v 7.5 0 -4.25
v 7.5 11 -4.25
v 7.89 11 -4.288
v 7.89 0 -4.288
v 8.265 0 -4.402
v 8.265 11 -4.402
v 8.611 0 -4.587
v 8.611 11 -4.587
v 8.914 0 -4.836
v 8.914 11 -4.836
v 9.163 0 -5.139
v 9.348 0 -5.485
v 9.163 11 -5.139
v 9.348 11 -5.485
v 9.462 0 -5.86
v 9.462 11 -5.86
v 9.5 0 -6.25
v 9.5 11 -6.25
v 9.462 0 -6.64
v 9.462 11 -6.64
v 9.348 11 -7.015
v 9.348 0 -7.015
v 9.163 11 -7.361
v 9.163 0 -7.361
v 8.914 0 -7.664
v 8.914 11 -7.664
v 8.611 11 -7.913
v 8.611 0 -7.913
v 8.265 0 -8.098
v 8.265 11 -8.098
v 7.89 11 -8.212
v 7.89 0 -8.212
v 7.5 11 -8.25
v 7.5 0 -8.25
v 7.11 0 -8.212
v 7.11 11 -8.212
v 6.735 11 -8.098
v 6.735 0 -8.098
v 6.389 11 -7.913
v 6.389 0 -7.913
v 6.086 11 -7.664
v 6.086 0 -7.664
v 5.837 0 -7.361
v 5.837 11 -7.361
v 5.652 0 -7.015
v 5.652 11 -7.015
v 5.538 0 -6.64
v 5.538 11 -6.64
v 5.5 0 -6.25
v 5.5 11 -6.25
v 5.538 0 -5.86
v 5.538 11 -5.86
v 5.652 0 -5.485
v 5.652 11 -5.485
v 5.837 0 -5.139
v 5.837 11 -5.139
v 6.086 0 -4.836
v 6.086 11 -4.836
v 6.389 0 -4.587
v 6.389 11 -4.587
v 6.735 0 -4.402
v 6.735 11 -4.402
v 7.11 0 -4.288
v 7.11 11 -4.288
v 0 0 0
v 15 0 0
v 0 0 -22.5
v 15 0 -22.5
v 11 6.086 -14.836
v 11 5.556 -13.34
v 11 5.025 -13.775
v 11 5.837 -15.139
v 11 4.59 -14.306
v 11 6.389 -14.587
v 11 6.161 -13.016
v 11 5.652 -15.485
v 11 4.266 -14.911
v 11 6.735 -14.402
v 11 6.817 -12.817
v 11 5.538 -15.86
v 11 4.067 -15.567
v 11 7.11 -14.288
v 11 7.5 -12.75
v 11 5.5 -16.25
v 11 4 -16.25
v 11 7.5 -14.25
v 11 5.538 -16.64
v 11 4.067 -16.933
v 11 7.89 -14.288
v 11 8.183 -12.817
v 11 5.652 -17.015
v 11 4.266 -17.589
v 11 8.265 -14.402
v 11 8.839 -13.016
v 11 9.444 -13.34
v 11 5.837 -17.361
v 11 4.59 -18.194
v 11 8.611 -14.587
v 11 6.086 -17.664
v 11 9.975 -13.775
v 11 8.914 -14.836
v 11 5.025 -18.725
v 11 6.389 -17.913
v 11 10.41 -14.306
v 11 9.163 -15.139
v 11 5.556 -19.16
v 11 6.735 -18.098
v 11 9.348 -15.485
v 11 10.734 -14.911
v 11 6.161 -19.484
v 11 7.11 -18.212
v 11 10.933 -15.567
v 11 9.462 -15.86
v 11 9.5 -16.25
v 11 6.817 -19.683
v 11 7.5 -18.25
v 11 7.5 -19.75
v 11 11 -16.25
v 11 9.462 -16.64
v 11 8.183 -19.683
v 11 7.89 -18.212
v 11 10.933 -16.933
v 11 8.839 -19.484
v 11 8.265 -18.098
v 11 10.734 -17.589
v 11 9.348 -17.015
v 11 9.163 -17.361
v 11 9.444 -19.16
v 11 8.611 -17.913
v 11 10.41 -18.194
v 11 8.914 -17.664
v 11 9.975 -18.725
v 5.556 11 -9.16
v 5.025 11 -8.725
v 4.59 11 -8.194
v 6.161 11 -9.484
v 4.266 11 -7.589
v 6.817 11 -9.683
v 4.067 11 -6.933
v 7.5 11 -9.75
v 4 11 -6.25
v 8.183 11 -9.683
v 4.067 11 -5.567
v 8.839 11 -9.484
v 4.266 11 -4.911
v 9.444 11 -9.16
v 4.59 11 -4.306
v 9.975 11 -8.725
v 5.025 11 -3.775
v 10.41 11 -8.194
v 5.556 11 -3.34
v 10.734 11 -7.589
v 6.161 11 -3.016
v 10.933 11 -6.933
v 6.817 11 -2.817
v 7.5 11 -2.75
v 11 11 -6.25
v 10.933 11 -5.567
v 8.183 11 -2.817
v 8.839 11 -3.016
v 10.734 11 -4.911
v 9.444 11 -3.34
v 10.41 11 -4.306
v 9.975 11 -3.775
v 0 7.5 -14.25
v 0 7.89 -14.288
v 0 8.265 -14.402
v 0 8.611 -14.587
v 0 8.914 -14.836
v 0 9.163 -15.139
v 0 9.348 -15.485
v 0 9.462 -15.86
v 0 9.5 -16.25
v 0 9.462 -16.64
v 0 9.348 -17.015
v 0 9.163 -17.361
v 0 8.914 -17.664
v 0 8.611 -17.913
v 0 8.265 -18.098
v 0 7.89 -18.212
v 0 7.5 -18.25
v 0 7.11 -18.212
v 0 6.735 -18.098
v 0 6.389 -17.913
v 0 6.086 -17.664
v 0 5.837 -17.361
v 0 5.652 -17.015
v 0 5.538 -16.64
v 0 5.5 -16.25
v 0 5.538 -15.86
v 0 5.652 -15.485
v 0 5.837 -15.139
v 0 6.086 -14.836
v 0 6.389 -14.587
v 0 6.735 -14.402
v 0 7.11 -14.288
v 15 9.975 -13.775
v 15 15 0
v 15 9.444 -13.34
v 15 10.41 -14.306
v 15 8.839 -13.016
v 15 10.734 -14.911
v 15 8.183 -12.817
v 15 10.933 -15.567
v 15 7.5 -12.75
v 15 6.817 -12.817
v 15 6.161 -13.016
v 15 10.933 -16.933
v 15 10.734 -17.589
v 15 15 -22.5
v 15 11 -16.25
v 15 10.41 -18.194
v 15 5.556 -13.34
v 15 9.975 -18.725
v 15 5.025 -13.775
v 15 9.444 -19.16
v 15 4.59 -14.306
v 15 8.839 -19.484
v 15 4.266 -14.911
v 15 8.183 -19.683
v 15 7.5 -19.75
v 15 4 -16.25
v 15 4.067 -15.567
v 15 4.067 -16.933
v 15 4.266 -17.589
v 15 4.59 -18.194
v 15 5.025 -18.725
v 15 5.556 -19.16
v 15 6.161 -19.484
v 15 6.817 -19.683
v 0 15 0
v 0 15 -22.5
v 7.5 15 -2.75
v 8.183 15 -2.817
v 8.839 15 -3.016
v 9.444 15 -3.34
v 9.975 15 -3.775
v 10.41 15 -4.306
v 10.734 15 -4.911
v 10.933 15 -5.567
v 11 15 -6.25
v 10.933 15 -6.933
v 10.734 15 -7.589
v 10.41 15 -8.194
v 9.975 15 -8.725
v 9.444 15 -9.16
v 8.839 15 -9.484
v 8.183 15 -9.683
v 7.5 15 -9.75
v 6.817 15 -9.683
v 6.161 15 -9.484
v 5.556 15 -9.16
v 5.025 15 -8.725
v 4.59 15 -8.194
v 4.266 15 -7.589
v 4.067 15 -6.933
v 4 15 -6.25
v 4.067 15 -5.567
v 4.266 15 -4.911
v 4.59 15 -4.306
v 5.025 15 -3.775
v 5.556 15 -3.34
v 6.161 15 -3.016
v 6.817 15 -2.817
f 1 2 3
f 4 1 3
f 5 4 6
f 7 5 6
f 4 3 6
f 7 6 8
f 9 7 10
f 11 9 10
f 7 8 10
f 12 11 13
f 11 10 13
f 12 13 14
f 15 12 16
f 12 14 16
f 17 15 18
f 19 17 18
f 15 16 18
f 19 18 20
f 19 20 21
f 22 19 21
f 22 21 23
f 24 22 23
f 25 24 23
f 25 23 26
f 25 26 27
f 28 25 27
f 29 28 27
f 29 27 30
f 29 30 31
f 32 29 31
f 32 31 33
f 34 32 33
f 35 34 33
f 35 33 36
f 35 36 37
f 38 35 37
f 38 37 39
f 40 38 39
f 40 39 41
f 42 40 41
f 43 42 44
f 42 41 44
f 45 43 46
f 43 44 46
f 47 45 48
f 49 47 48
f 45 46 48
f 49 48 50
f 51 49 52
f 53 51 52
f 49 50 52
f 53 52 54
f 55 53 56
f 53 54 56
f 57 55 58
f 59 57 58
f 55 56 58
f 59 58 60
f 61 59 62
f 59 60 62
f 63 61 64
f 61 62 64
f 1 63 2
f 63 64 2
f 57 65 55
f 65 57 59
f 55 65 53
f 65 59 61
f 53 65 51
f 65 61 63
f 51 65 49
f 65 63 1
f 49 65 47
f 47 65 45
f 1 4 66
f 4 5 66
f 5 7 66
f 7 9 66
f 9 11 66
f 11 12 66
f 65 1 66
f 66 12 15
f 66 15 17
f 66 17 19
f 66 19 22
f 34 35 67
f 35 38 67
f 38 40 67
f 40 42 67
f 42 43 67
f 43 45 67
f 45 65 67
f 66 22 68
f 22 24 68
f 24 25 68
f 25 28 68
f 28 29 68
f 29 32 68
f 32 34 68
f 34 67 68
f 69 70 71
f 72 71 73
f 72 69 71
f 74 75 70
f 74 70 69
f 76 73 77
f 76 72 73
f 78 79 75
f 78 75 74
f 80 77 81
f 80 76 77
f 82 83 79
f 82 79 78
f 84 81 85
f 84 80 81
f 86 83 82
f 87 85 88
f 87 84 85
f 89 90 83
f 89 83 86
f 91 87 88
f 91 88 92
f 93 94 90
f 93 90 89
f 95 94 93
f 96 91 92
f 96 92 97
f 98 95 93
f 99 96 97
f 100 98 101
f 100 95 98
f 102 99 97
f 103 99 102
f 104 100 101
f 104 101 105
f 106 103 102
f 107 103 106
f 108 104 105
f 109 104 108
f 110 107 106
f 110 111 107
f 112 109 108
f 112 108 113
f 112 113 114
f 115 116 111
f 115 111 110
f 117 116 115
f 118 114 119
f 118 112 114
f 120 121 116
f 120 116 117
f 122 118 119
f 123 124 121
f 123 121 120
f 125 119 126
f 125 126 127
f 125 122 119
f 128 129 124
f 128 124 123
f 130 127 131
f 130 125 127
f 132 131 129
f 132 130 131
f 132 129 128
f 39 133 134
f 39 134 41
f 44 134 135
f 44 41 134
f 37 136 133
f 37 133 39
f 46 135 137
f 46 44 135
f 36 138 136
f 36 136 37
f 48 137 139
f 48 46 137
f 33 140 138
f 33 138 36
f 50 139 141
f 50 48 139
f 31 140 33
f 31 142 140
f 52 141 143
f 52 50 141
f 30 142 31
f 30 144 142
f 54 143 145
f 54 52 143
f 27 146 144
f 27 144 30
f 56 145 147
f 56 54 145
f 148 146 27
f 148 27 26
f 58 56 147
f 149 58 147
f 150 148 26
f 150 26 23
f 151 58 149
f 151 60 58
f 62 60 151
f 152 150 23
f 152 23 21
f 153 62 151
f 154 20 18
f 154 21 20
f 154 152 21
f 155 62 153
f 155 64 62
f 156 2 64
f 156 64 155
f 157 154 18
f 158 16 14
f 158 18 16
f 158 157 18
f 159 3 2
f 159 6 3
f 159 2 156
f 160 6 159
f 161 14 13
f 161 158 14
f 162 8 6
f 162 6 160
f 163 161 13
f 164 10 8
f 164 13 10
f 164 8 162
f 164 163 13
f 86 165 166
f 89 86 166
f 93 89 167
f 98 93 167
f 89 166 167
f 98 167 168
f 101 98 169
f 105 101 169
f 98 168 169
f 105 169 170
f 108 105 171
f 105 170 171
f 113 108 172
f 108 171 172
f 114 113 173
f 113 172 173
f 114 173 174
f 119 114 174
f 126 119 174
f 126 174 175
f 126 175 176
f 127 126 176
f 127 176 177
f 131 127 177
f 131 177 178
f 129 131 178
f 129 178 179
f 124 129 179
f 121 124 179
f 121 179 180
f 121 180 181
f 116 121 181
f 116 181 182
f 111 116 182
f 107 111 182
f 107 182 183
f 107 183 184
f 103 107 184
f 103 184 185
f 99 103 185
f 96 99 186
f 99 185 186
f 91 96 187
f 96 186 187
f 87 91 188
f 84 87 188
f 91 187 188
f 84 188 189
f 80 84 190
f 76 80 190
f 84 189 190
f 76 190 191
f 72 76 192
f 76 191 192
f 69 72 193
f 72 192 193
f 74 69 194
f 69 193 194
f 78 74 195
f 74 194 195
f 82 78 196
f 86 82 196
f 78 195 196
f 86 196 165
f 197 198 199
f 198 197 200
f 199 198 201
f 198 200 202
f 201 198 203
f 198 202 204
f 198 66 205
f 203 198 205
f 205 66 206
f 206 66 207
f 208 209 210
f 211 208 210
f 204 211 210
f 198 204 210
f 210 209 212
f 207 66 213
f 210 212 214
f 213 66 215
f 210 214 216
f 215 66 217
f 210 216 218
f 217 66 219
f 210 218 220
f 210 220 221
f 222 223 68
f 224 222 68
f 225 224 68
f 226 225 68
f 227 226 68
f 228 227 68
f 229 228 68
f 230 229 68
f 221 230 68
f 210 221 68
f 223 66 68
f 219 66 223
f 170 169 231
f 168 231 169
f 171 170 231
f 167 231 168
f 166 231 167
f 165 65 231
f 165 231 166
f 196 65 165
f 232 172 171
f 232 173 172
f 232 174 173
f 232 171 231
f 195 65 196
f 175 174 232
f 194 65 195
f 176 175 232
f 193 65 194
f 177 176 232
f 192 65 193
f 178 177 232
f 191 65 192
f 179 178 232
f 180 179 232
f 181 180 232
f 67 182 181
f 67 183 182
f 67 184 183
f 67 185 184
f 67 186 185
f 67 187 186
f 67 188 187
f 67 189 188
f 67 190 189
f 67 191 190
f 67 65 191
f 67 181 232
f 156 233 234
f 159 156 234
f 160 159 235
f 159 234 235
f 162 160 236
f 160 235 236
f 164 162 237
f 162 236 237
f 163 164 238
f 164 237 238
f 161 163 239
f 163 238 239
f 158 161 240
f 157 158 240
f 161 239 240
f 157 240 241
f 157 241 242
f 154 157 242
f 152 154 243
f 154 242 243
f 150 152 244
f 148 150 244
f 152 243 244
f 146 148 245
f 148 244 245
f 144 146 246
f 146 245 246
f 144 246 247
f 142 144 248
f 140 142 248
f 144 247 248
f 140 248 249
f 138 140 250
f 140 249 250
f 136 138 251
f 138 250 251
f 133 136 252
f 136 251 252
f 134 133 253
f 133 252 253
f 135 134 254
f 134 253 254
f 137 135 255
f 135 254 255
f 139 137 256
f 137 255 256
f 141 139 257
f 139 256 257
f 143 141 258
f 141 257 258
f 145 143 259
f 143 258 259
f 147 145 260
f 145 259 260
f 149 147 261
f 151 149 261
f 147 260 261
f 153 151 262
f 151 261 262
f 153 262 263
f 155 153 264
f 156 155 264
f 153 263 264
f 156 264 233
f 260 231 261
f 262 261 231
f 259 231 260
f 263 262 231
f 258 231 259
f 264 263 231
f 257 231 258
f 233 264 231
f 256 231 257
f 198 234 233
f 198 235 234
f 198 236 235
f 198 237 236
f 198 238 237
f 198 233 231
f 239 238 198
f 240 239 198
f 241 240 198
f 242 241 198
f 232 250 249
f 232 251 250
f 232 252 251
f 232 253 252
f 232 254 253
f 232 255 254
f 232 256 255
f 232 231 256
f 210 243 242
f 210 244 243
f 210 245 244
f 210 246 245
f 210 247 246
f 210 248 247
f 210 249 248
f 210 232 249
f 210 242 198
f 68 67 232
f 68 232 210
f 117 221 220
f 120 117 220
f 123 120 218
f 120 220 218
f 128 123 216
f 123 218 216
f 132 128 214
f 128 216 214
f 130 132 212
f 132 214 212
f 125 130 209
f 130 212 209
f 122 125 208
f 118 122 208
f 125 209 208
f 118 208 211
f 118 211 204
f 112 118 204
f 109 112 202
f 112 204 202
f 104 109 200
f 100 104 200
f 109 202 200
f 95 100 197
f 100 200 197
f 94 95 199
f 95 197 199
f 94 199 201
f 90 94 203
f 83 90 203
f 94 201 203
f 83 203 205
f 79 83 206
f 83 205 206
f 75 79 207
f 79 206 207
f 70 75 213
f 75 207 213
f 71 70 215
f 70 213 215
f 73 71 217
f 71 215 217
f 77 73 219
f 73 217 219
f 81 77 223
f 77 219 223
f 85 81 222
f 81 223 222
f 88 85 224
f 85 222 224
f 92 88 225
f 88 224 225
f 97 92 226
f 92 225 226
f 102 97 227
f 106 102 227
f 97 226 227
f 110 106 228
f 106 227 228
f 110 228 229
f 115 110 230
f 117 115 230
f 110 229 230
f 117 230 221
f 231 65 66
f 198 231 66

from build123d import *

# Parameters (mm, degrees)
SKETCH1_W           = 15
SKETCH1_H           = 22.5
BOSS_EXTRUDE1_DEPTH = 15
SKETCH2_R           = 2
CUT_EXTRUDE1_DEPTH  = 31.923292192
SKETCH3_R           = 2
CUT_EXTRUDE2_DEPTH  = 31.923292192
SKETCH4_R           = 3.5
CUT_EXTRUDE3_DEPTH  = 4
SKETCH5_R           = 3.5
CUT_EXTRUDE4_DEPTH  = 4


with BuildPart() as part:
    # Sketch1 → Boss-Extrude1 (new body)
    with BuildSketch(Plane(origin=(0, 0, 0), x_dir=(1, 0, 0), z_dir=(0, 1, 0))):
        with Locations((7.5, 11.25)):
            Rectangle(SKETCH1_W, SKETCH1_H)
    extrude(amount=BOSS_EXTRUDE1_DEPTH)

    # Sketch2 → Cut-Extrude1 (cut, through all)
    with BuildSketch(Plane(origin=(0, 15, 0), x_dir=(1, 0, 0), z_dir=(0, 1, 0))):
        with Locations(Location((7.5, 6.25, 0), (0, 0, 270))):
            Circle(SKETCH2_R)
    extrude(amount=-CUT_EXTRUDE1_DEPTH, mode=Mode.SUBTRACT)

    # Sketch3 → Cut-Extrude2 (cut, through all)
    with BuildSketch(Plane.ZY):
        with Locations((-16.25, 7.5)):
            Circle(SKETCH3_R)
    extrude(amount=-CUT_EXTRUDE2_DEPTH, mode=Mode.SUBTRACT)

    # Sketch4 → Cut-Extrude3 (cut)
    with BuildSketch(Plane(origin=(0, 15, 0), x_dir=(1, 0, 0), z_dir=(0, 1, 0))):
        with Locations(Location((7.5, 6.25, 0), (0, 0, 270))):
            Circle(SKETCH4_R)
    extrude(amount=-CUT_EXTRUDE3_DEPTH, mode=Mode.SUBTRACT)

    # Sketch5 → Cut-Extrude4 (cut)
    with BuildSketch(Plane(origin=(15, 0, 0), x_dir=(0, 0, -1), z_dir=(1, 0, 0))):
        with Locations((16.25, 7.5)):
            Circle(SKETCH5_R)
    extrude(amount=-CUT_EXTRUDE4_DEPTH, mode=Mode.SUBTRACT)


solid = part.part
